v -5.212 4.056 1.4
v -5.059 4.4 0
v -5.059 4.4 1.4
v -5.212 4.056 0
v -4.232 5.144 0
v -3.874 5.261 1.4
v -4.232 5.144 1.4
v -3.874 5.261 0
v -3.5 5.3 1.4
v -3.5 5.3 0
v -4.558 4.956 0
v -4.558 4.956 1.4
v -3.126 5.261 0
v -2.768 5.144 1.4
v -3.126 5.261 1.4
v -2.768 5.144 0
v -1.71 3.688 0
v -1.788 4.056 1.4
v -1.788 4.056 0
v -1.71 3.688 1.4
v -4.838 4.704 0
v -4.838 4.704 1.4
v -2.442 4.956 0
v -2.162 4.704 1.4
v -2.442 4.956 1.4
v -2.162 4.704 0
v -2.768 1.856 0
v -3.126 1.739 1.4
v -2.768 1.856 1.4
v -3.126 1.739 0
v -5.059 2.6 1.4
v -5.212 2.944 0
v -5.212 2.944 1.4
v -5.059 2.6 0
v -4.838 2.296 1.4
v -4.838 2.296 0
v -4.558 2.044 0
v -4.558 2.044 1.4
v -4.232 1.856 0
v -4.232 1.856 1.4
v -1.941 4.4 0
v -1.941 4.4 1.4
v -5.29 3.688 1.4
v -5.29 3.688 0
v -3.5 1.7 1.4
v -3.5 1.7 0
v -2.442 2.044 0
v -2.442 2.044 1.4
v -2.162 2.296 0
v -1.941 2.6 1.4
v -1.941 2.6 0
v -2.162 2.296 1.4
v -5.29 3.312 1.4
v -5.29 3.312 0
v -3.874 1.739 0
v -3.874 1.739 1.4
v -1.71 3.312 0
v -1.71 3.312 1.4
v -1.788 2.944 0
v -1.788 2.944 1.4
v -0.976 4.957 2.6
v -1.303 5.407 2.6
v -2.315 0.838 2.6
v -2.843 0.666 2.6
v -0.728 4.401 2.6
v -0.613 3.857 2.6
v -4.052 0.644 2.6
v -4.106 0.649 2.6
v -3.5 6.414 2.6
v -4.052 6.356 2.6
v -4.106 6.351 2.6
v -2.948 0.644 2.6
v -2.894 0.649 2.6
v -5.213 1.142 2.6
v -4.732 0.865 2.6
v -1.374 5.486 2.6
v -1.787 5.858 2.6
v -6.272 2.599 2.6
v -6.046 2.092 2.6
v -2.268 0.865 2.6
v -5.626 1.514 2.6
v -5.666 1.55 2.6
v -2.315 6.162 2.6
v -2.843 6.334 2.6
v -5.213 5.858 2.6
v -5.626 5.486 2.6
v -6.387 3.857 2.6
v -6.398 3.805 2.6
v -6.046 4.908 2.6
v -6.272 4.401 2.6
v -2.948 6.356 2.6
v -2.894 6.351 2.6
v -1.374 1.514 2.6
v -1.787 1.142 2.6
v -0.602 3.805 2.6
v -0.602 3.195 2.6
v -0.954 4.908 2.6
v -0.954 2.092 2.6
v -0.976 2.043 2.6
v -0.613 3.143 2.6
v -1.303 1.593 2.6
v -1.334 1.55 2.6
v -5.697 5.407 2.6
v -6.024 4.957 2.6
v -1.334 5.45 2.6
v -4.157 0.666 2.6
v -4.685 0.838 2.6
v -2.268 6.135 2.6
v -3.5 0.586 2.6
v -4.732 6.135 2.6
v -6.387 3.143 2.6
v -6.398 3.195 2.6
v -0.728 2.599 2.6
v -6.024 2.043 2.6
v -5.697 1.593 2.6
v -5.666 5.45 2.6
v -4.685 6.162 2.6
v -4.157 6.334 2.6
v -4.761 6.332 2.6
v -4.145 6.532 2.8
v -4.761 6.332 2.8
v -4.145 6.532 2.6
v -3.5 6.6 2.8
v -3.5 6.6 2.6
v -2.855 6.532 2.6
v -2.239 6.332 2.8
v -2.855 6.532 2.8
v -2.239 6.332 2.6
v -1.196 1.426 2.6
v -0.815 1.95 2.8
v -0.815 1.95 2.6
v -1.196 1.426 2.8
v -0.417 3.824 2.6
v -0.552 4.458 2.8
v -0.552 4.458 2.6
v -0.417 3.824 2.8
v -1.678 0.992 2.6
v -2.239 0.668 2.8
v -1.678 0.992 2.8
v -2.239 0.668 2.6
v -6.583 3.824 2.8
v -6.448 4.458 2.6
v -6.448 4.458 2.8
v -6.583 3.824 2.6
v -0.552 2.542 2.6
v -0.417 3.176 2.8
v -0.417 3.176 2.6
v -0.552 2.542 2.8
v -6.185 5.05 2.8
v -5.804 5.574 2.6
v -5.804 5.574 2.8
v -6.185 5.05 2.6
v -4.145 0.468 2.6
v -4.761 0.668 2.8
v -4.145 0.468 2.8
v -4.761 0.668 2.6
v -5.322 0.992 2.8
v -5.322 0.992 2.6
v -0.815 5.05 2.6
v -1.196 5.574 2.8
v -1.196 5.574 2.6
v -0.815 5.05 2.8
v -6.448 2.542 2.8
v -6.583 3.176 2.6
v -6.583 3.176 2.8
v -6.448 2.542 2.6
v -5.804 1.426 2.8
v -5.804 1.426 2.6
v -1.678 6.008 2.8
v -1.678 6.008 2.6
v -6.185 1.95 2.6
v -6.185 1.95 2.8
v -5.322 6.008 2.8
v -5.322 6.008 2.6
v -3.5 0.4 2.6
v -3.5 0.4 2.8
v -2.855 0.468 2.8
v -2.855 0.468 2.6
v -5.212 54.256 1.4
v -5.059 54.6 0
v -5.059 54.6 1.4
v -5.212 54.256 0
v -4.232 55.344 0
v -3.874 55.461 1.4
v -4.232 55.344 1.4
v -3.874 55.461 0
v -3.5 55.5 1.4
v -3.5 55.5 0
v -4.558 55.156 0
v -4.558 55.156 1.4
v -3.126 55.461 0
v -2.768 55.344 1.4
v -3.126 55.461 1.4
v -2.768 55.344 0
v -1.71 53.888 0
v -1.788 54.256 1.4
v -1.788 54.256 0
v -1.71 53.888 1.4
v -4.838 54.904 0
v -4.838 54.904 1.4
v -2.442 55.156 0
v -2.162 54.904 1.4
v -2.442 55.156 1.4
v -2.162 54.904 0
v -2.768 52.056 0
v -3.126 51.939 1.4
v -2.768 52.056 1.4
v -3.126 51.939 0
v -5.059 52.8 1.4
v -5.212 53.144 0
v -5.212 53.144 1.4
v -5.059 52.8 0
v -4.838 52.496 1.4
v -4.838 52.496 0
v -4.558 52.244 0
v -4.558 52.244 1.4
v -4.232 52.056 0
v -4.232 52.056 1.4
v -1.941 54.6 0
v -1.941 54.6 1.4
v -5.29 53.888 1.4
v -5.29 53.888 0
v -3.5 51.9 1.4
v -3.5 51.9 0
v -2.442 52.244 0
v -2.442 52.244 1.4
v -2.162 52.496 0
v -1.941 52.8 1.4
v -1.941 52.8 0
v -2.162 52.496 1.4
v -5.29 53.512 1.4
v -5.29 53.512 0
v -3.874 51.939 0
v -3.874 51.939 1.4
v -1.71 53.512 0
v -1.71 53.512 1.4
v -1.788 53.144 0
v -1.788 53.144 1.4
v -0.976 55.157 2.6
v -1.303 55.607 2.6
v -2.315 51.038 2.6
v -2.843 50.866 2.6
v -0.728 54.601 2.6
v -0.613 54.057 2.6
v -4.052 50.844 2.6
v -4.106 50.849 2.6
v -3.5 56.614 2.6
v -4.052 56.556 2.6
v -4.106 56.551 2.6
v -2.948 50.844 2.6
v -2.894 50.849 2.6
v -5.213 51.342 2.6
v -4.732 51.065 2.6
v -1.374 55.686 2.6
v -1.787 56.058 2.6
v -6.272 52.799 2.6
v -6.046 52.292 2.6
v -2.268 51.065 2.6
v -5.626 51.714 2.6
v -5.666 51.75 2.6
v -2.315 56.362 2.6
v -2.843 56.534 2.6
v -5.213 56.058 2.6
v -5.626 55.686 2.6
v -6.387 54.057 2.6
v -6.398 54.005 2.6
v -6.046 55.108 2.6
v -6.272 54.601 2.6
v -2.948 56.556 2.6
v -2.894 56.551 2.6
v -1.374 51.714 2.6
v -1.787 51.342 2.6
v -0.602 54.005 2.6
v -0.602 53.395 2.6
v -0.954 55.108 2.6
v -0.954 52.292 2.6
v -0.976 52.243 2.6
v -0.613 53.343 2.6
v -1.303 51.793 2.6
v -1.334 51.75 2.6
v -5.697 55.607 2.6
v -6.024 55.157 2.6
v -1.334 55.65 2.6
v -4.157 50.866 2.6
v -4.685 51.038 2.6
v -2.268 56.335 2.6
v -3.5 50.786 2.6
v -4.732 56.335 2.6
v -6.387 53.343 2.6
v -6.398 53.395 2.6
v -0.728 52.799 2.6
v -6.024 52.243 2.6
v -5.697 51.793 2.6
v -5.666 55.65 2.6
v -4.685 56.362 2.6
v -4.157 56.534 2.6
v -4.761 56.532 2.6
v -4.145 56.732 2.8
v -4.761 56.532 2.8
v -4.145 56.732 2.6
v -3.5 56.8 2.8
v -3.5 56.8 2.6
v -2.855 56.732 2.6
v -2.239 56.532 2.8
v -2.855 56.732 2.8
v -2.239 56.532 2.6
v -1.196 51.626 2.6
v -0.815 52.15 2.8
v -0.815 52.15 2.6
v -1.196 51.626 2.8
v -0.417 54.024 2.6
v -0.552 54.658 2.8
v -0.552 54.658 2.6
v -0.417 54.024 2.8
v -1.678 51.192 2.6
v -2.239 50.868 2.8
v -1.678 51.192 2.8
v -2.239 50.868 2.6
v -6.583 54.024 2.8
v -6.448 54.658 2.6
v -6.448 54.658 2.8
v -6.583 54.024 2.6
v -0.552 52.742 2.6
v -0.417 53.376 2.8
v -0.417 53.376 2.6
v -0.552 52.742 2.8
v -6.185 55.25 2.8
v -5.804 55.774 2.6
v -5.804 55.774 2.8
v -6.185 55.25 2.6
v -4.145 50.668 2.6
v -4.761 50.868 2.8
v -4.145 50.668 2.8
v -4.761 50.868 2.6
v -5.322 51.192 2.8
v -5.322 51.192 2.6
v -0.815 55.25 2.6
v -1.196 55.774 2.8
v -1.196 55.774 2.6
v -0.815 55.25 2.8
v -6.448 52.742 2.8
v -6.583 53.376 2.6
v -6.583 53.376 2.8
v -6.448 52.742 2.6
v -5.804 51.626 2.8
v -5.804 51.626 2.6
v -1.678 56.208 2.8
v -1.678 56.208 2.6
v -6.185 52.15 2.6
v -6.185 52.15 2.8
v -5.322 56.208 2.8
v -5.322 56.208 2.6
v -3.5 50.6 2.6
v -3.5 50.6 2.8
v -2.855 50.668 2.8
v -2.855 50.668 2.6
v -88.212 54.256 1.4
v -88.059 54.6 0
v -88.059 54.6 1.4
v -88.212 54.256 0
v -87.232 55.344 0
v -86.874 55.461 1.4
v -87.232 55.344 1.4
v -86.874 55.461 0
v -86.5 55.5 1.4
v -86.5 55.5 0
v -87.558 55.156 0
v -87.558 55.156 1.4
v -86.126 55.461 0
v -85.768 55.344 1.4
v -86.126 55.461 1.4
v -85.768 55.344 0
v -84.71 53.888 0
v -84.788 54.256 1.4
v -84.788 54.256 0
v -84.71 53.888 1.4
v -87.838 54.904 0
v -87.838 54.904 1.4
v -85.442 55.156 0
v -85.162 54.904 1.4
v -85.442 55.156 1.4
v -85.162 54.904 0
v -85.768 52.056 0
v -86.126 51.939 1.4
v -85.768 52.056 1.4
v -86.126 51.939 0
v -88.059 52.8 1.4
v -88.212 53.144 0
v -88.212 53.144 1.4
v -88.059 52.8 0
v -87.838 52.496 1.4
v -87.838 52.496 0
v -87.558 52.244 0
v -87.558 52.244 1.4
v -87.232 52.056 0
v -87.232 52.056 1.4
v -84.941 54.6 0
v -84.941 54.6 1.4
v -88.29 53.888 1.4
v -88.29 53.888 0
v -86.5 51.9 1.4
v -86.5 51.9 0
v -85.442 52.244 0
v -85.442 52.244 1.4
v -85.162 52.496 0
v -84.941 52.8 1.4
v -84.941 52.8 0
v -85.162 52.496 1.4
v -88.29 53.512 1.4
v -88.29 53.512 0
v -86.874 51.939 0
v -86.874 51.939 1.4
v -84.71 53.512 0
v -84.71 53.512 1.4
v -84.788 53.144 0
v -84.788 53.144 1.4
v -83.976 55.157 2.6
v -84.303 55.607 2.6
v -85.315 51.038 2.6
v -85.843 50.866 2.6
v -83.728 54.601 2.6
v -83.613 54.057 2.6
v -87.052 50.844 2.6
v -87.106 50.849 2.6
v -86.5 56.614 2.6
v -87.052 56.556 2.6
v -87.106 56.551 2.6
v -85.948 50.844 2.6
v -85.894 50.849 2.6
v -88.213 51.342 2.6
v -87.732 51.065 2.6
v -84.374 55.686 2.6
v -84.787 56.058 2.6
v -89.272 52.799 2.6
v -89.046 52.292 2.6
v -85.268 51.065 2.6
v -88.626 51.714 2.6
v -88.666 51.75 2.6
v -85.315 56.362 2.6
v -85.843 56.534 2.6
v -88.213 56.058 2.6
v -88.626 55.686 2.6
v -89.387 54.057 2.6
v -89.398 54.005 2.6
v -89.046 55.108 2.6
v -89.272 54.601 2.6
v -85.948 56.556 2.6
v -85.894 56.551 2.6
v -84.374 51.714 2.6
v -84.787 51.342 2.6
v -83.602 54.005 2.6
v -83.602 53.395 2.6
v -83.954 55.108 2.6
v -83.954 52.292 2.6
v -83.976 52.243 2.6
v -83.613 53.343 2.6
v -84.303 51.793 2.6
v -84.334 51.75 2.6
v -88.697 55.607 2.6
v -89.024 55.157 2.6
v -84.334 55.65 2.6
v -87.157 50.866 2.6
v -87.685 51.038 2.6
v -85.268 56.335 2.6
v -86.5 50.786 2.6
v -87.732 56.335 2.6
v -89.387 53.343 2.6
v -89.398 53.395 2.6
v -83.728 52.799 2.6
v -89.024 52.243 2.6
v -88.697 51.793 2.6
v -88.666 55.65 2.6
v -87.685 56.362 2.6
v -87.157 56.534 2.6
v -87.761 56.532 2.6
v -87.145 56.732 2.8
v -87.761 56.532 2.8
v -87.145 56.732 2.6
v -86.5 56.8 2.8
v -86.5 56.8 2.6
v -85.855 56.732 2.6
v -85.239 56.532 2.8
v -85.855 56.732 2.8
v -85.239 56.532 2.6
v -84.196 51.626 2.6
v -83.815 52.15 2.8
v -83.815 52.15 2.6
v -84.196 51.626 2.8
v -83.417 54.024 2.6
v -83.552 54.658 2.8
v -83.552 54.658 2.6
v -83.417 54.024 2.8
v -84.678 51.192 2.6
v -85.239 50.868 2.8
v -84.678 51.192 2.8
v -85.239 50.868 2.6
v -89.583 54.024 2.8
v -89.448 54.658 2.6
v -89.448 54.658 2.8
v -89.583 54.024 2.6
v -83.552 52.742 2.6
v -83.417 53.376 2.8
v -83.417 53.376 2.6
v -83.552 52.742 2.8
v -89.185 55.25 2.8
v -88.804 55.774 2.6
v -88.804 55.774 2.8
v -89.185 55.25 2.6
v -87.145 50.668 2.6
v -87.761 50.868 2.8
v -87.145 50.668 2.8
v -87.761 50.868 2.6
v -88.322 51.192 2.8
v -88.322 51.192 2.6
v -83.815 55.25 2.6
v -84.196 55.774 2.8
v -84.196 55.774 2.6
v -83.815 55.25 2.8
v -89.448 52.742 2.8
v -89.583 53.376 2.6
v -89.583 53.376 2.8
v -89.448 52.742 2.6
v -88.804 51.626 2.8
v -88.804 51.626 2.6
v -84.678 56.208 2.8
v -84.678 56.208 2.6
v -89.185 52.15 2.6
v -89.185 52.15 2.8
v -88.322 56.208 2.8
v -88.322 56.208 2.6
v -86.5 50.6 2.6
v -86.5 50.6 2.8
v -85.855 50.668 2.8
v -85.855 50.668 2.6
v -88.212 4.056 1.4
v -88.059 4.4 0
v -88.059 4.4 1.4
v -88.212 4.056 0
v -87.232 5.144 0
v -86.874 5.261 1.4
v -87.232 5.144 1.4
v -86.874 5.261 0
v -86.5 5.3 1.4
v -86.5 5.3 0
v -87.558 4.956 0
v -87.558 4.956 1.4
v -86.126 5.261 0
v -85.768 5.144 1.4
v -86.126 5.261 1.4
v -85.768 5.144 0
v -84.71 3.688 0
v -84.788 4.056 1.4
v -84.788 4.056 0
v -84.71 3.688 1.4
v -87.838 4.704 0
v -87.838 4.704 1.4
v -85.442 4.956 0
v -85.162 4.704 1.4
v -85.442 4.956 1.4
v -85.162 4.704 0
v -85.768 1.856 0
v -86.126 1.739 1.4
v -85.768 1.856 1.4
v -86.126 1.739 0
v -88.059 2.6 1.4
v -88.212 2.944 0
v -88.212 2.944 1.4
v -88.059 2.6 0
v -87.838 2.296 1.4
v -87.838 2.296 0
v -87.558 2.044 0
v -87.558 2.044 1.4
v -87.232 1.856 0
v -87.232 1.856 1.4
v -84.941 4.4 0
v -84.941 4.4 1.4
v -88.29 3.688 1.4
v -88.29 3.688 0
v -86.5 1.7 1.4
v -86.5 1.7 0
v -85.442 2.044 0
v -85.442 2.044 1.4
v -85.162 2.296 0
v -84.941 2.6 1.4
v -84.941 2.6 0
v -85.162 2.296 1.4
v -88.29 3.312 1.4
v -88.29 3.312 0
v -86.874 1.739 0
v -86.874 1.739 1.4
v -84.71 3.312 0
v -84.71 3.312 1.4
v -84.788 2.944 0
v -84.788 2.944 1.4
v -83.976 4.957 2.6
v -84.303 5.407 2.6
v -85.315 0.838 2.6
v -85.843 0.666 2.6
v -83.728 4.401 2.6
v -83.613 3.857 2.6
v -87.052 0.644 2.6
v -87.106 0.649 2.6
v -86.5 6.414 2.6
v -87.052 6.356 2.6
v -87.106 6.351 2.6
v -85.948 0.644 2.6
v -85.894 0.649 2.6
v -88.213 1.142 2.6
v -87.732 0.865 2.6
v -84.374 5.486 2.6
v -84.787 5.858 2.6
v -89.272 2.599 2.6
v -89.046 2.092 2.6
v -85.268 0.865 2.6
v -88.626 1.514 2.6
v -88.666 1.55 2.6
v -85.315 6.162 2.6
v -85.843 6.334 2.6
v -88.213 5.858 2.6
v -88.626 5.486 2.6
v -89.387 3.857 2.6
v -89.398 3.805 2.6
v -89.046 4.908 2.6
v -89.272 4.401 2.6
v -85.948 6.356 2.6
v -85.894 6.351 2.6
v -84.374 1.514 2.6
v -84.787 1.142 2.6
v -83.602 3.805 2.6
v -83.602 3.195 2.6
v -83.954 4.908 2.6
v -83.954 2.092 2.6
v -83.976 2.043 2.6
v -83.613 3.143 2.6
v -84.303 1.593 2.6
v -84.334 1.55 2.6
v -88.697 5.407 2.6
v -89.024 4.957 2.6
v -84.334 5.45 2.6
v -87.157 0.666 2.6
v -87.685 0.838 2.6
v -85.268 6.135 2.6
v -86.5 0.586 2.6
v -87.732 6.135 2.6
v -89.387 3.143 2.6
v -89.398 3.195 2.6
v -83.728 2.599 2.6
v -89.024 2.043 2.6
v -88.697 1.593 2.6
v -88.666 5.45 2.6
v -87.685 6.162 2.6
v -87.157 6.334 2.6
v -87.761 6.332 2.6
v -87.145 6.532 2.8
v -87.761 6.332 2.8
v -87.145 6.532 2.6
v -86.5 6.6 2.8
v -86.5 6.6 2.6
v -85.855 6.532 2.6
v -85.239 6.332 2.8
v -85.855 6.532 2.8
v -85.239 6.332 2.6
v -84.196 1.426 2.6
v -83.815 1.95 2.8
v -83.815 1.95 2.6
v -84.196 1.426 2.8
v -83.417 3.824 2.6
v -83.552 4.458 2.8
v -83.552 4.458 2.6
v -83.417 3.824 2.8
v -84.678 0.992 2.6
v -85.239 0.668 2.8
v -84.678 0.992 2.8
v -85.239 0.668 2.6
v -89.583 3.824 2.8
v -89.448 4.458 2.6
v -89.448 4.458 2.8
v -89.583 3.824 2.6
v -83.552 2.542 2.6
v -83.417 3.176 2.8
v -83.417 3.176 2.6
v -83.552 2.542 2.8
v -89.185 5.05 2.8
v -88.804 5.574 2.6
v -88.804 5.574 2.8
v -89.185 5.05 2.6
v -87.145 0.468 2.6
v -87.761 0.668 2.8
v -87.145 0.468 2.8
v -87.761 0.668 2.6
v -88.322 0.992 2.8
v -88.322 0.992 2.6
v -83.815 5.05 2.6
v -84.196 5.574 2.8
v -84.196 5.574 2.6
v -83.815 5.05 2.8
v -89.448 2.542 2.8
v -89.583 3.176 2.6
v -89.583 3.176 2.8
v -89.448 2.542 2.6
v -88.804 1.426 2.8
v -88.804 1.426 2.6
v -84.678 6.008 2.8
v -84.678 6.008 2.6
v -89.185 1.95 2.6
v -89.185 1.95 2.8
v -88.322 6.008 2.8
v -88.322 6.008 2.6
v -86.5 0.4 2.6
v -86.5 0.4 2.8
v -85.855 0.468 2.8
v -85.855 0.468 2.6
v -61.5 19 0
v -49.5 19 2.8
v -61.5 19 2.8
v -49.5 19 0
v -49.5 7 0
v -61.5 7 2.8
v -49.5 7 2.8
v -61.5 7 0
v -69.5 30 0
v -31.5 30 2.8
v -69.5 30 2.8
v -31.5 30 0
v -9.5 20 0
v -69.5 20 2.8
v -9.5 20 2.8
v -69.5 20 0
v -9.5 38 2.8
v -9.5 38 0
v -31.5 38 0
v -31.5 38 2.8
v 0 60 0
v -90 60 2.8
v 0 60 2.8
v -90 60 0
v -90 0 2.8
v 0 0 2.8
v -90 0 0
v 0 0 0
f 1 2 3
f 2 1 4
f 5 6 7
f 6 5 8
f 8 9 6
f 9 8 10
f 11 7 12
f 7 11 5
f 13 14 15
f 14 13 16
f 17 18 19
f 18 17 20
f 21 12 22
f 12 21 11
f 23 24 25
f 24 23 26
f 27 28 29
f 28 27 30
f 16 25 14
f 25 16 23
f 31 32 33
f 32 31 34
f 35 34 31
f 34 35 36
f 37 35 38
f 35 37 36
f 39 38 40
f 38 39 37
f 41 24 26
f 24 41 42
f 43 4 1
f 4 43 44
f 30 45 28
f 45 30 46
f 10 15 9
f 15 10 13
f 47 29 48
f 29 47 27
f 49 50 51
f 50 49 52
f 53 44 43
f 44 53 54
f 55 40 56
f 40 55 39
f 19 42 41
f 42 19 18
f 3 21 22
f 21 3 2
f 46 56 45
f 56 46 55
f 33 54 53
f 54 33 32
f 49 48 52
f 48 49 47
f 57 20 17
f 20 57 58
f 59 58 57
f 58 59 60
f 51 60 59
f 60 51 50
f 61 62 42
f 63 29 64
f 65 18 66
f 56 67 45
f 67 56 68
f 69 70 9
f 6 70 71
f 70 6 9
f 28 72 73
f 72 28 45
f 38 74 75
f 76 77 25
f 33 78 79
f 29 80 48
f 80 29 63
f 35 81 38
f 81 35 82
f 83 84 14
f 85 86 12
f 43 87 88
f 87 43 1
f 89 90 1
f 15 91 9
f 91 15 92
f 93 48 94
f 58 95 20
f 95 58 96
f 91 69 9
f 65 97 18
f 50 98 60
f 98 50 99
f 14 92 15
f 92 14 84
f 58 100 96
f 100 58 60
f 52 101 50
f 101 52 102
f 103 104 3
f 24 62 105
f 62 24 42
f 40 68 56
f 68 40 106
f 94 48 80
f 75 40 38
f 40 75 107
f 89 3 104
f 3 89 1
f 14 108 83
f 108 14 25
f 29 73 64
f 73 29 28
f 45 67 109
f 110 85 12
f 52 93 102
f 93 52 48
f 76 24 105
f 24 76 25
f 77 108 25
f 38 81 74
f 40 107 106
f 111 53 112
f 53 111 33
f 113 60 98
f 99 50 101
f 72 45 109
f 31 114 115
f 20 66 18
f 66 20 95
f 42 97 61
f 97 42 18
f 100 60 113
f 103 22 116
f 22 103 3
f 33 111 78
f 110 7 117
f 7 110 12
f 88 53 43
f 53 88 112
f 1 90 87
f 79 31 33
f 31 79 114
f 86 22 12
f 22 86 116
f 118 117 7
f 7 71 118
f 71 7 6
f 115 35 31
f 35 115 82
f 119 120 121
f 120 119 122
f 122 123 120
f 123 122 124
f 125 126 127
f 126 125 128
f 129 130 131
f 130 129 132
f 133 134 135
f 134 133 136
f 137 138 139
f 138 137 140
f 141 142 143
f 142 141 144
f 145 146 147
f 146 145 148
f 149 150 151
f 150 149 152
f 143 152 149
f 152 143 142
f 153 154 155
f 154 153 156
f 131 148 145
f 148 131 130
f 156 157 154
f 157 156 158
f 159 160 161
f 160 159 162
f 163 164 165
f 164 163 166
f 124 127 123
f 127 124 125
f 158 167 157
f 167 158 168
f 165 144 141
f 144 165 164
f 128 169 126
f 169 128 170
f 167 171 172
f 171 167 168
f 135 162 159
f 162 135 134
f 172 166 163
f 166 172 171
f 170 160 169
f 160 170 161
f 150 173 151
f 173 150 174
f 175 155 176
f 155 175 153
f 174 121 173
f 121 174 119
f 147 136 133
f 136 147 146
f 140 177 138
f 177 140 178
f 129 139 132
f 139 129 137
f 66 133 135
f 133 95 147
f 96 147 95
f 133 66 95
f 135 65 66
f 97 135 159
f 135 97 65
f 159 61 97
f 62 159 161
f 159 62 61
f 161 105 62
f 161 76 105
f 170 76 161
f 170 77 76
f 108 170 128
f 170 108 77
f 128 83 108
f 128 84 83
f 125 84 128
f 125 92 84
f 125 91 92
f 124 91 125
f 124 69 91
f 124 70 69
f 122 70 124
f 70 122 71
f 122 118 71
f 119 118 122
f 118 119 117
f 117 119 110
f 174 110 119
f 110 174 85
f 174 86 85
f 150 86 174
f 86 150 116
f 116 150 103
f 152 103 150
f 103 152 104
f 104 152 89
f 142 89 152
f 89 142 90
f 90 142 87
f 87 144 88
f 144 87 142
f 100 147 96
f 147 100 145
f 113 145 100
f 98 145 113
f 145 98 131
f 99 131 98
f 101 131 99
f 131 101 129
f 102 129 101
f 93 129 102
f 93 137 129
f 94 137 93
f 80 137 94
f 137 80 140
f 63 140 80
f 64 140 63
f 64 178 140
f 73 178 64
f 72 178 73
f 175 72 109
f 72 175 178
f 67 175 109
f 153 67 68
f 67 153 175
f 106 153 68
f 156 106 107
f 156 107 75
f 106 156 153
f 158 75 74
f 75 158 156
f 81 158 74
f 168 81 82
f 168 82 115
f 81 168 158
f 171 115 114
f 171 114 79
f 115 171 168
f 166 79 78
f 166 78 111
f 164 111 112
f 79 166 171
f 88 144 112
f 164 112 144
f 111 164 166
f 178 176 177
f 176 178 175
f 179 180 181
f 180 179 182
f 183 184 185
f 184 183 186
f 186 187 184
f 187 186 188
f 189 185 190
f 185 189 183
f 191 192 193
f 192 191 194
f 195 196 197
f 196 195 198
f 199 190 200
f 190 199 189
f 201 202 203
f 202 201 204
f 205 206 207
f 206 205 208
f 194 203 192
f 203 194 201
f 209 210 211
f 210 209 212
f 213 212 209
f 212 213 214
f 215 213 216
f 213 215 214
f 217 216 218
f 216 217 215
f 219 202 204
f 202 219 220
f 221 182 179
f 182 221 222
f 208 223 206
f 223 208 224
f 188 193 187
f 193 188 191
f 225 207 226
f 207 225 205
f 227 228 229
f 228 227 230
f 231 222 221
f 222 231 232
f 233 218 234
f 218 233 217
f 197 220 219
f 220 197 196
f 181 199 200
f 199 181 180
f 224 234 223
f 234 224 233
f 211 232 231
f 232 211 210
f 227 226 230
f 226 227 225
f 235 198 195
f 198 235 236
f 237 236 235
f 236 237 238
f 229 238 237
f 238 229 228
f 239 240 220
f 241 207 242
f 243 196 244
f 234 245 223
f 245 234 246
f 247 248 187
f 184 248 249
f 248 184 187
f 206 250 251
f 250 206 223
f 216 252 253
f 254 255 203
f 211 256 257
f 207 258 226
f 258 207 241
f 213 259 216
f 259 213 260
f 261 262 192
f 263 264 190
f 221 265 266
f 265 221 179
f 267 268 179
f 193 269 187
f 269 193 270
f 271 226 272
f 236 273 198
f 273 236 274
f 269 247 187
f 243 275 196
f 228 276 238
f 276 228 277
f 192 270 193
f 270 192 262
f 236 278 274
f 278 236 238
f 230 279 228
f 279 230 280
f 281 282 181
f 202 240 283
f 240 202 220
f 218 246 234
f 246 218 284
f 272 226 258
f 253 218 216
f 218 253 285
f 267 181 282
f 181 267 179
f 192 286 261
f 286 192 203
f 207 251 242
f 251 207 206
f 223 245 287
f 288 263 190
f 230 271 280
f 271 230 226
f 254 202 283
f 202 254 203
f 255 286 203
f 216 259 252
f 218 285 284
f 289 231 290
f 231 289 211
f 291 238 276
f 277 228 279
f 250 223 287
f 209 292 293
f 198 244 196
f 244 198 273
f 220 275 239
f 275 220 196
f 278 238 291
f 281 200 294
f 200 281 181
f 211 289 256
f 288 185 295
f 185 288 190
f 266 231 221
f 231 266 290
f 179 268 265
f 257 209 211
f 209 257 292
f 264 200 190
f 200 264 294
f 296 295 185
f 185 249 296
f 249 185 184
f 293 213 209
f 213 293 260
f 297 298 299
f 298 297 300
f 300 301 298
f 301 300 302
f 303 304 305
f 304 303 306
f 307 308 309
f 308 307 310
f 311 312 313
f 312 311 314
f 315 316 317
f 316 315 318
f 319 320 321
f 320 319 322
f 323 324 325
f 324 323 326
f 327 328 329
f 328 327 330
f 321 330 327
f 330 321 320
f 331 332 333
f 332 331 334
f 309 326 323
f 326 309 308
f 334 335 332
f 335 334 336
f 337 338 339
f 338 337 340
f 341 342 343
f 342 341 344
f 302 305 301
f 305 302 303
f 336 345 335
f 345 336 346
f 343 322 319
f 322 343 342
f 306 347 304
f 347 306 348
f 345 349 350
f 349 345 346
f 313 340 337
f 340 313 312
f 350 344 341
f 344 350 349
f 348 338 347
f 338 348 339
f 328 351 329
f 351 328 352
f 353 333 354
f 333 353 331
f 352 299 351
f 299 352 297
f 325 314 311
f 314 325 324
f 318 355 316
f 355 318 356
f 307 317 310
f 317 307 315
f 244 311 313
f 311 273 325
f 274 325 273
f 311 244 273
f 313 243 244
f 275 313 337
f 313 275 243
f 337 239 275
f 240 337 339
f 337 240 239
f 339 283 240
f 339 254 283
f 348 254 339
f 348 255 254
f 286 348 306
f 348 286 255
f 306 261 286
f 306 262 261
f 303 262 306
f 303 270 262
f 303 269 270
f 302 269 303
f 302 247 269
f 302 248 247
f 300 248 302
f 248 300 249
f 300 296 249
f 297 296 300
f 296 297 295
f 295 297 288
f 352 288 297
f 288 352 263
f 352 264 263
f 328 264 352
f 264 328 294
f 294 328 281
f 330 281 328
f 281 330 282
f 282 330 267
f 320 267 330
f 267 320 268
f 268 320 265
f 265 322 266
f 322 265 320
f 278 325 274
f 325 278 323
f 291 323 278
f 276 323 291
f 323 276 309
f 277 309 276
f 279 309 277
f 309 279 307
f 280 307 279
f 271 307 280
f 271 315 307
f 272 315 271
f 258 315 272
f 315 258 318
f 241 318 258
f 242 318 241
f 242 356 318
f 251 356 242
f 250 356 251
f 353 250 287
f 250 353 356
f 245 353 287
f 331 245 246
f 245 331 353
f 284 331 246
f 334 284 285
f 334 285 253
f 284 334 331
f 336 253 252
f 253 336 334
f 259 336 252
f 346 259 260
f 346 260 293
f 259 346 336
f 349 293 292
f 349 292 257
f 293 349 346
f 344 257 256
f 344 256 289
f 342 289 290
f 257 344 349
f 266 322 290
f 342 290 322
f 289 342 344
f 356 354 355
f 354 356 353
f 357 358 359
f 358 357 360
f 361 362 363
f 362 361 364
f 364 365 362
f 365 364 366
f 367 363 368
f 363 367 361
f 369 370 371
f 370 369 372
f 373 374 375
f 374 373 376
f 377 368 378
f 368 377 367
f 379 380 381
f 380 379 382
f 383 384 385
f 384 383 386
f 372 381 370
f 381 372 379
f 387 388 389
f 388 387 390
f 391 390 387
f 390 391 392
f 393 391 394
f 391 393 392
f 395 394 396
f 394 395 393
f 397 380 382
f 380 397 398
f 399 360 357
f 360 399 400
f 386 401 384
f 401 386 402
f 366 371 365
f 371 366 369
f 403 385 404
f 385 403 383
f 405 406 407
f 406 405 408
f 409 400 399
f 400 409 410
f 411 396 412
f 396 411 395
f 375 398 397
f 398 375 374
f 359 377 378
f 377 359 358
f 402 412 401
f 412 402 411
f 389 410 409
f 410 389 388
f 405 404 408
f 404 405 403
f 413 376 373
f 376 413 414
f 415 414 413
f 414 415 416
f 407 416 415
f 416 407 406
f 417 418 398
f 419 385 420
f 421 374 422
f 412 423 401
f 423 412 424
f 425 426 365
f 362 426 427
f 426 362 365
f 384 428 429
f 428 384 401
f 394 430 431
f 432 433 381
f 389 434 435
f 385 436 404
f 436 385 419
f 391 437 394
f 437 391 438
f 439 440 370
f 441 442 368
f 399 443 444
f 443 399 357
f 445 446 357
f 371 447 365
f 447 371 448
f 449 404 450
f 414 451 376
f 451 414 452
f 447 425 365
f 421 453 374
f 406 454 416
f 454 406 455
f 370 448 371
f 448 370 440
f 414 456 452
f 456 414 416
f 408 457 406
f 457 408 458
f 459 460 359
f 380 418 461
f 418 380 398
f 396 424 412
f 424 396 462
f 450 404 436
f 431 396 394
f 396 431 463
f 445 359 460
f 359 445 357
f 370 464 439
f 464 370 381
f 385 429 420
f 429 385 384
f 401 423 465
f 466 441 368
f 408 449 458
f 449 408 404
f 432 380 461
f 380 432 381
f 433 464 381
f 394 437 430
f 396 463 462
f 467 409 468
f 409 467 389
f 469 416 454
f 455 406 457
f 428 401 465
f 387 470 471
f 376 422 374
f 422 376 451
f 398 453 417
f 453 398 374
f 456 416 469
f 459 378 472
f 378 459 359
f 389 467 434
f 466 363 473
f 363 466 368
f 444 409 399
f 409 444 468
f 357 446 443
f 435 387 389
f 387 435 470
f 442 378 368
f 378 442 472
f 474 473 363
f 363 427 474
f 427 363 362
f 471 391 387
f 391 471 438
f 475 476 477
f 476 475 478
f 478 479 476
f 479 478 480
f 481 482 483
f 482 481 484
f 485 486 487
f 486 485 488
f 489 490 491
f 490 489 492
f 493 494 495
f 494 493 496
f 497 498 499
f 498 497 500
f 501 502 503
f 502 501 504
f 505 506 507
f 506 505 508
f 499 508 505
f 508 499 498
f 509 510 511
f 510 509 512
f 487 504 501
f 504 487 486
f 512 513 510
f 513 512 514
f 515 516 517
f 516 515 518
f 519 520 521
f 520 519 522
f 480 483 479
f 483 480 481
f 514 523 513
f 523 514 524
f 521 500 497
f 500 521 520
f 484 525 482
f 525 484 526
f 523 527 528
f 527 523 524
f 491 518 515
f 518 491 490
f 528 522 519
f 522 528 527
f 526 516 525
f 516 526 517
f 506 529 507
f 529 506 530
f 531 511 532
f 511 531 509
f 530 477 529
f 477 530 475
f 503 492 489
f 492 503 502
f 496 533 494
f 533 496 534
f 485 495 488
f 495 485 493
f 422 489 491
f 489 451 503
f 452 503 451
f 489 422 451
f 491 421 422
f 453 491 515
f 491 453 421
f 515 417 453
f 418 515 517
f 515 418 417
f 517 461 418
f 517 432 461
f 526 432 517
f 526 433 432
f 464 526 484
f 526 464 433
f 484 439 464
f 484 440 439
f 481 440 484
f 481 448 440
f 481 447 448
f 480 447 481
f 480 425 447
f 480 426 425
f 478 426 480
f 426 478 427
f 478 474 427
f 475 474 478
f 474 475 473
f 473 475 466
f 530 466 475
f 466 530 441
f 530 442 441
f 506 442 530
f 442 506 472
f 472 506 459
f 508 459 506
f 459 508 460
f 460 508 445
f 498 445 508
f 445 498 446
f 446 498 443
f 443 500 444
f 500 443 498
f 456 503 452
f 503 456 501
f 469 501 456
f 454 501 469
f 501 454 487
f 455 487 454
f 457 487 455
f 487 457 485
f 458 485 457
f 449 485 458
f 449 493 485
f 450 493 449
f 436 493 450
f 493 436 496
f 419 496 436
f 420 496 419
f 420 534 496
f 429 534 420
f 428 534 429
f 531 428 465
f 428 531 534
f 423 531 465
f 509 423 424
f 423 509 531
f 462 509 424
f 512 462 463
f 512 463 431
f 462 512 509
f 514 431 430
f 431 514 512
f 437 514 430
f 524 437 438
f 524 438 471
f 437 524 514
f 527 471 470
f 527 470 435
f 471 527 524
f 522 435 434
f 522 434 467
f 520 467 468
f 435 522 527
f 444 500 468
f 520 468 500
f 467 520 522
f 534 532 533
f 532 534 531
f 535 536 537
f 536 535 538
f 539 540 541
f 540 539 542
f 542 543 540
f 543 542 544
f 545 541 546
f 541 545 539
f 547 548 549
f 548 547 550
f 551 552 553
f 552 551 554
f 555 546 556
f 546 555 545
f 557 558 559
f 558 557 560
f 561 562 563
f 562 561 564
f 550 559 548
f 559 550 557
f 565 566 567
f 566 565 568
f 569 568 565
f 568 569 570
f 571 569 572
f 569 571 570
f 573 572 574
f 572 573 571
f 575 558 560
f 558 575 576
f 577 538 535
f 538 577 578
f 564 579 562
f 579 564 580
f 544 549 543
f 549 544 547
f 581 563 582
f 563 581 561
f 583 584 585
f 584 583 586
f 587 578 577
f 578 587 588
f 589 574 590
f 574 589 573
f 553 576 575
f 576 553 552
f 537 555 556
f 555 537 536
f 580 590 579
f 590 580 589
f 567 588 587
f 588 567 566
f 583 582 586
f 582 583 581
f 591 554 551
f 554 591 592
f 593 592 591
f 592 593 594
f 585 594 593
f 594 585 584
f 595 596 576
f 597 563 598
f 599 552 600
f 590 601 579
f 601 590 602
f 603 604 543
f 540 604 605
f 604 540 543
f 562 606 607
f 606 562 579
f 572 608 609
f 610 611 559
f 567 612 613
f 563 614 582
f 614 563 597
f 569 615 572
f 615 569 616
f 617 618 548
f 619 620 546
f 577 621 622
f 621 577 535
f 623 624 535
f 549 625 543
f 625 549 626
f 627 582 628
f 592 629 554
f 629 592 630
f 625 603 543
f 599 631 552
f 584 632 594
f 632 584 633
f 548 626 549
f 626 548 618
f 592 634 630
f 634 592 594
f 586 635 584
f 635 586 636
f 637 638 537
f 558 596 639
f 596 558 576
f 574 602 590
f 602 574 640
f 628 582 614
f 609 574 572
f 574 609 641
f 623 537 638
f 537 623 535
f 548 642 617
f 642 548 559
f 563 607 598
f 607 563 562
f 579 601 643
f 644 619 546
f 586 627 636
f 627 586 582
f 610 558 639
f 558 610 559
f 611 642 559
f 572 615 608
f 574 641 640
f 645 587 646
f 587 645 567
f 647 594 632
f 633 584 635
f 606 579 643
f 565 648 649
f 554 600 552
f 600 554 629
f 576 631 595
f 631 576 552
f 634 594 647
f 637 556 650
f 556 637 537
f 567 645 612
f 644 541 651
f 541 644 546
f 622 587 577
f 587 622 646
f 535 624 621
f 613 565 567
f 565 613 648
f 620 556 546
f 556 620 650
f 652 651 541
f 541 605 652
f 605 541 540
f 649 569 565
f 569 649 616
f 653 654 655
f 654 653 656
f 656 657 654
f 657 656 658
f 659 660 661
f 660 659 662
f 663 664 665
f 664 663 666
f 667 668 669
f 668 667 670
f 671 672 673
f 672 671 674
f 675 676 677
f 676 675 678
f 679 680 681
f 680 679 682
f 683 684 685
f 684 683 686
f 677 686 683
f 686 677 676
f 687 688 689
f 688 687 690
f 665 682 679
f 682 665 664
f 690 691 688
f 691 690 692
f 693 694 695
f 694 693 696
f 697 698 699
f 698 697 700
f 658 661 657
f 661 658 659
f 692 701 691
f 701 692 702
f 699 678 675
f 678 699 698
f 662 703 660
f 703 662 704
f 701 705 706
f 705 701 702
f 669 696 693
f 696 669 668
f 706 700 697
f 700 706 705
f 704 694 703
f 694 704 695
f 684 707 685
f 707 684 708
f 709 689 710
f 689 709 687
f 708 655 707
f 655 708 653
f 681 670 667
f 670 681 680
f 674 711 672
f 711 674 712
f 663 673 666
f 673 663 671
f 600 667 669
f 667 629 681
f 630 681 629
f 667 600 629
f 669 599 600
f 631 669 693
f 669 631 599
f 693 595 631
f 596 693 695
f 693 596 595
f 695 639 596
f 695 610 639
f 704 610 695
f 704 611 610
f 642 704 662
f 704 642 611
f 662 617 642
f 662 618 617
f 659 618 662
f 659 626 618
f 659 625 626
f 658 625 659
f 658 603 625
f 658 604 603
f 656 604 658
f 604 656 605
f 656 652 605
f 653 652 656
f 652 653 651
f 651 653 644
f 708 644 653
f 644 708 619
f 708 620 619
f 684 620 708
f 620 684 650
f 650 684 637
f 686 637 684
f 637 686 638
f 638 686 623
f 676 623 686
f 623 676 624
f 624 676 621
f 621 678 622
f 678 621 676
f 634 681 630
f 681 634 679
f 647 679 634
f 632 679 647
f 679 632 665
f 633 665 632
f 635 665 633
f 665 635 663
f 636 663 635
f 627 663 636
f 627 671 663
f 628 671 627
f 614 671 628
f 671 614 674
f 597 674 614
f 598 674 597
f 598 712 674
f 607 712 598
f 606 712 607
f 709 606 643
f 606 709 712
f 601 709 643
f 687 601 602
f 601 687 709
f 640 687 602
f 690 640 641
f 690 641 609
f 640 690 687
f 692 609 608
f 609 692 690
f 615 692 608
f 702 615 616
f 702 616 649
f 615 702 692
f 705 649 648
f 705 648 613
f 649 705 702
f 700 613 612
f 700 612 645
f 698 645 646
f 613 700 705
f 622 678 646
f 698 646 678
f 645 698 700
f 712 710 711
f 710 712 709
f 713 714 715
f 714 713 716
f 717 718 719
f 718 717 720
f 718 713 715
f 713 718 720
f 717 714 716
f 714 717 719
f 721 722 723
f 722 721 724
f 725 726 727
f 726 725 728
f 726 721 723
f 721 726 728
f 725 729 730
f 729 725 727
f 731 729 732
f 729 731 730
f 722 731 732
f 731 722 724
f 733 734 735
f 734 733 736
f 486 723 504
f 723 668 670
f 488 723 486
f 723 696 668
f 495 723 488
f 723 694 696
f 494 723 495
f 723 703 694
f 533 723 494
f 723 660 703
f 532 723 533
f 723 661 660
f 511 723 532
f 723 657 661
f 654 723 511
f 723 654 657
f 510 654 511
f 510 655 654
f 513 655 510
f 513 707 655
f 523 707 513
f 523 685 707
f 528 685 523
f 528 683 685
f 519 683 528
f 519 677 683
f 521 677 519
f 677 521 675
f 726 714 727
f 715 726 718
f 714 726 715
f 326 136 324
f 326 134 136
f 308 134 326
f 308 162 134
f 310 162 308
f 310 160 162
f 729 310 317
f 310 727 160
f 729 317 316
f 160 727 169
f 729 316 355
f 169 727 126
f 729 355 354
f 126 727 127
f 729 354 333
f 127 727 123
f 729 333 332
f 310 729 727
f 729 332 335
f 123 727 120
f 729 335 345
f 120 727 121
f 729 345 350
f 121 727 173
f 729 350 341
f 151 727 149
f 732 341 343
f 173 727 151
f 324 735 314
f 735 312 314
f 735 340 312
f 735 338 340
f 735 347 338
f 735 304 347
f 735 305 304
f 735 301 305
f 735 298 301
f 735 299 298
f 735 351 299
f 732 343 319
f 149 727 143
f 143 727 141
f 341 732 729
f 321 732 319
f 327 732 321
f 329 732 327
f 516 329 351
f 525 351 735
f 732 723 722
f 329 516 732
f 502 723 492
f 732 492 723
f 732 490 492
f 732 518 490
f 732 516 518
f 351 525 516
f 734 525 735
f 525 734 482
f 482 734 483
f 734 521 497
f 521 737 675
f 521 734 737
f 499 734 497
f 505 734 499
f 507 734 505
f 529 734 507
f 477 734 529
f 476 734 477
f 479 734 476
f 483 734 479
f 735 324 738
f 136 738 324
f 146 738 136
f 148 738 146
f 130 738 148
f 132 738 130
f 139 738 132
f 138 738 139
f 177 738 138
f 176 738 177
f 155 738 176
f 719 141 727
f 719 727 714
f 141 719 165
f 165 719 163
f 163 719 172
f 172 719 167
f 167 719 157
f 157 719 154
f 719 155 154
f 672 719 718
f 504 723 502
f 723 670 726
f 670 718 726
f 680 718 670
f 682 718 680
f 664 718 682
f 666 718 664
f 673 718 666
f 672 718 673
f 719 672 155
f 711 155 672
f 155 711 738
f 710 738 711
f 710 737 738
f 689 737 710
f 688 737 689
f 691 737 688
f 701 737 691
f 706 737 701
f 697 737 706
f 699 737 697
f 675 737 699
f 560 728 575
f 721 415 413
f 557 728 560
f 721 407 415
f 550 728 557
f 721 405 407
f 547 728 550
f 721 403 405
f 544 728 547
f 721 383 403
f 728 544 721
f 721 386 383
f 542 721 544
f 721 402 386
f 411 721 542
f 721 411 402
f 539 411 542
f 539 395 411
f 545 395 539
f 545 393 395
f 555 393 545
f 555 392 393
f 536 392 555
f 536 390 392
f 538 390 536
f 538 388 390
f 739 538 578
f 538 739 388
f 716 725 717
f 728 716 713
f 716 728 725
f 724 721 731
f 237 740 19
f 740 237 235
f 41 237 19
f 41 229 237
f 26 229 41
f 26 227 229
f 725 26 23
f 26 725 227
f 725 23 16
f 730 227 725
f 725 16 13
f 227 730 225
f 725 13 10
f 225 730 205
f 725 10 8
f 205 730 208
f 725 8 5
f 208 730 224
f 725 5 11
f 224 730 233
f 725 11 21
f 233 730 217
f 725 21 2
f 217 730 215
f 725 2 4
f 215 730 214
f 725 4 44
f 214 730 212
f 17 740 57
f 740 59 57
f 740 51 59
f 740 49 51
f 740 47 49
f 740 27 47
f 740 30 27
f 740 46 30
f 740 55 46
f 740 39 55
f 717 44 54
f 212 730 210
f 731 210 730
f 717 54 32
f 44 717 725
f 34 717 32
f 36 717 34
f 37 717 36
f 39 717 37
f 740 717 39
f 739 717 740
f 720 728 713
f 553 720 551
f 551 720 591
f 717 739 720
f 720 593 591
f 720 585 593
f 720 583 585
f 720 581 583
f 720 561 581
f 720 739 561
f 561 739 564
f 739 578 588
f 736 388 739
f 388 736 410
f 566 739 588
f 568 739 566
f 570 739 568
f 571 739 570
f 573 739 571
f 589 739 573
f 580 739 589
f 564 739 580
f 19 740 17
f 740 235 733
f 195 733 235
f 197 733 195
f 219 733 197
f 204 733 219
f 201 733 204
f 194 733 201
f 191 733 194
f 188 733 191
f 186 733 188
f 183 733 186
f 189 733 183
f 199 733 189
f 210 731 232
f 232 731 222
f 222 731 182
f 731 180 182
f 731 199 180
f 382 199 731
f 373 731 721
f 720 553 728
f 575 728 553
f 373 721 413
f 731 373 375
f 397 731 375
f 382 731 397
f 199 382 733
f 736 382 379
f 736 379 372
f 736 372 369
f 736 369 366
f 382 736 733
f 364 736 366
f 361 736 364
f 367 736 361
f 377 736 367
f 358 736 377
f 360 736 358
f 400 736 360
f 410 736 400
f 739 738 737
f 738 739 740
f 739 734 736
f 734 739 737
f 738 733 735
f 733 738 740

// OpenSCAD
/* [Global] */

// Do you want holes for Arduino/Ramps1.4?
arduino_ramp_hole = "YES"; // [NO:No,YES:Yes]

// Do you want holes for d-sub?
dsub = 0; // [0:No,25:9pin,33.3:15pin,47.17:25pin,63.5:37pin]
dsub_x = 50; // [60]
dsub_y = 50; // [90]

// preview[view:south, tilt:top]

module screw_hole(){
    cylinder($depth+2,1.8,1.8,$fn=30);
    translate([0,0,2.4])cylinder(1.4,1.8,3.1,$fn=30);
    translate([0,0,3.6])cylinder(1.3,3.1,3.1,$fn=30);
}

module arduino_ramp_hole(){
	translate([7,49.5,-1])cube([12,12,10]);
	translate([20,9.5,-1])cube([10,60,10]);
	translate([20,9.5,-1])cube([18,22,10]);
}


module dsub_hole($size){
    $height=12;
   
    translate([-$size/2,0,0]){
        translate([0,0,0])cylinder($height-2,1.42,1.42,$fn=30);
        
        difference(){
            translate([4.04,-4.18,0])cube([$size/2-8.08/2+0.1,8.36,$height-2]);
            translate([3.04+0.5,-4.18-1,-1])rotate([0,0,10])cube([2,10,$height]);
            translate([5.6,2.76,0])difference(){
                translate([-2.42,-0.2,-1])cube([2.42,2.42,$height]);
                cylinder($height,1.42,1.42,$fn=30);
            }
            translate([6.565,-2.76,0])difference(){
                translate([-1.42,-1.44,-1])cube([1.42,1.42,$height]);
                cylinder($height,1.42,1.42,$fn=30);
            }
        }
    }
    mirror()translate([-$size/2,0,0]){
        translate([0,0,0])cylinder($height-2,1.42,1.42,$fn=30);
        
        difference(){
            translate([4.04,-4.18,0])cube([$size/2-8.08/2+0.1,8.36,$height-2]);
            translate([3.04+0.5,-4.18-1,-1])rotate([0,0,10])cube([2,10,$height]);
            translate([5.6,2.76,0])difference(){
                translate([-2.42,-0.2,-1])cube([2.42,2.42,$height]);
                cylinder($height,1.42,1.42,$fn=30);
            }
            translate([6.565,-2.76,0])difference(){
                translate([-1.42,-1.44,-1])cube([1.42,1.42,$height]);
                cylinder($height,1.42,1.42,$fn=30);
            }
        }
    }
}

module plate(){
    $depth=2.8;
    $plate_width=90;
    $plate_length=60;
    
	difference() {
		cube([$plate_length,$plate_width,$depth],0);
		translate([3.5,3.5,-1])screw_hole();
		translate([53.7,3.5,-1])screw_hole();
		translate([53.7,86.5,-1])screw_hole();
		translate([3.5,86.5,-1])screw_hole();
		if(arduino_ramp_hole=="YES"){arduino_ramp_hole();}
        if(dsub>0){translate([dsub_x,dsub_y,-1])rotate(270)dsub_hole(dsub);}
	}
}

rotate(90)plate();

//QA
//rotate([0,90,0]) translate([-2.5,2.5,-2.5]){
//    import("/home/feiming/Downloads/Front_side_Size2_corrected.stl", convexity=3);
//}
